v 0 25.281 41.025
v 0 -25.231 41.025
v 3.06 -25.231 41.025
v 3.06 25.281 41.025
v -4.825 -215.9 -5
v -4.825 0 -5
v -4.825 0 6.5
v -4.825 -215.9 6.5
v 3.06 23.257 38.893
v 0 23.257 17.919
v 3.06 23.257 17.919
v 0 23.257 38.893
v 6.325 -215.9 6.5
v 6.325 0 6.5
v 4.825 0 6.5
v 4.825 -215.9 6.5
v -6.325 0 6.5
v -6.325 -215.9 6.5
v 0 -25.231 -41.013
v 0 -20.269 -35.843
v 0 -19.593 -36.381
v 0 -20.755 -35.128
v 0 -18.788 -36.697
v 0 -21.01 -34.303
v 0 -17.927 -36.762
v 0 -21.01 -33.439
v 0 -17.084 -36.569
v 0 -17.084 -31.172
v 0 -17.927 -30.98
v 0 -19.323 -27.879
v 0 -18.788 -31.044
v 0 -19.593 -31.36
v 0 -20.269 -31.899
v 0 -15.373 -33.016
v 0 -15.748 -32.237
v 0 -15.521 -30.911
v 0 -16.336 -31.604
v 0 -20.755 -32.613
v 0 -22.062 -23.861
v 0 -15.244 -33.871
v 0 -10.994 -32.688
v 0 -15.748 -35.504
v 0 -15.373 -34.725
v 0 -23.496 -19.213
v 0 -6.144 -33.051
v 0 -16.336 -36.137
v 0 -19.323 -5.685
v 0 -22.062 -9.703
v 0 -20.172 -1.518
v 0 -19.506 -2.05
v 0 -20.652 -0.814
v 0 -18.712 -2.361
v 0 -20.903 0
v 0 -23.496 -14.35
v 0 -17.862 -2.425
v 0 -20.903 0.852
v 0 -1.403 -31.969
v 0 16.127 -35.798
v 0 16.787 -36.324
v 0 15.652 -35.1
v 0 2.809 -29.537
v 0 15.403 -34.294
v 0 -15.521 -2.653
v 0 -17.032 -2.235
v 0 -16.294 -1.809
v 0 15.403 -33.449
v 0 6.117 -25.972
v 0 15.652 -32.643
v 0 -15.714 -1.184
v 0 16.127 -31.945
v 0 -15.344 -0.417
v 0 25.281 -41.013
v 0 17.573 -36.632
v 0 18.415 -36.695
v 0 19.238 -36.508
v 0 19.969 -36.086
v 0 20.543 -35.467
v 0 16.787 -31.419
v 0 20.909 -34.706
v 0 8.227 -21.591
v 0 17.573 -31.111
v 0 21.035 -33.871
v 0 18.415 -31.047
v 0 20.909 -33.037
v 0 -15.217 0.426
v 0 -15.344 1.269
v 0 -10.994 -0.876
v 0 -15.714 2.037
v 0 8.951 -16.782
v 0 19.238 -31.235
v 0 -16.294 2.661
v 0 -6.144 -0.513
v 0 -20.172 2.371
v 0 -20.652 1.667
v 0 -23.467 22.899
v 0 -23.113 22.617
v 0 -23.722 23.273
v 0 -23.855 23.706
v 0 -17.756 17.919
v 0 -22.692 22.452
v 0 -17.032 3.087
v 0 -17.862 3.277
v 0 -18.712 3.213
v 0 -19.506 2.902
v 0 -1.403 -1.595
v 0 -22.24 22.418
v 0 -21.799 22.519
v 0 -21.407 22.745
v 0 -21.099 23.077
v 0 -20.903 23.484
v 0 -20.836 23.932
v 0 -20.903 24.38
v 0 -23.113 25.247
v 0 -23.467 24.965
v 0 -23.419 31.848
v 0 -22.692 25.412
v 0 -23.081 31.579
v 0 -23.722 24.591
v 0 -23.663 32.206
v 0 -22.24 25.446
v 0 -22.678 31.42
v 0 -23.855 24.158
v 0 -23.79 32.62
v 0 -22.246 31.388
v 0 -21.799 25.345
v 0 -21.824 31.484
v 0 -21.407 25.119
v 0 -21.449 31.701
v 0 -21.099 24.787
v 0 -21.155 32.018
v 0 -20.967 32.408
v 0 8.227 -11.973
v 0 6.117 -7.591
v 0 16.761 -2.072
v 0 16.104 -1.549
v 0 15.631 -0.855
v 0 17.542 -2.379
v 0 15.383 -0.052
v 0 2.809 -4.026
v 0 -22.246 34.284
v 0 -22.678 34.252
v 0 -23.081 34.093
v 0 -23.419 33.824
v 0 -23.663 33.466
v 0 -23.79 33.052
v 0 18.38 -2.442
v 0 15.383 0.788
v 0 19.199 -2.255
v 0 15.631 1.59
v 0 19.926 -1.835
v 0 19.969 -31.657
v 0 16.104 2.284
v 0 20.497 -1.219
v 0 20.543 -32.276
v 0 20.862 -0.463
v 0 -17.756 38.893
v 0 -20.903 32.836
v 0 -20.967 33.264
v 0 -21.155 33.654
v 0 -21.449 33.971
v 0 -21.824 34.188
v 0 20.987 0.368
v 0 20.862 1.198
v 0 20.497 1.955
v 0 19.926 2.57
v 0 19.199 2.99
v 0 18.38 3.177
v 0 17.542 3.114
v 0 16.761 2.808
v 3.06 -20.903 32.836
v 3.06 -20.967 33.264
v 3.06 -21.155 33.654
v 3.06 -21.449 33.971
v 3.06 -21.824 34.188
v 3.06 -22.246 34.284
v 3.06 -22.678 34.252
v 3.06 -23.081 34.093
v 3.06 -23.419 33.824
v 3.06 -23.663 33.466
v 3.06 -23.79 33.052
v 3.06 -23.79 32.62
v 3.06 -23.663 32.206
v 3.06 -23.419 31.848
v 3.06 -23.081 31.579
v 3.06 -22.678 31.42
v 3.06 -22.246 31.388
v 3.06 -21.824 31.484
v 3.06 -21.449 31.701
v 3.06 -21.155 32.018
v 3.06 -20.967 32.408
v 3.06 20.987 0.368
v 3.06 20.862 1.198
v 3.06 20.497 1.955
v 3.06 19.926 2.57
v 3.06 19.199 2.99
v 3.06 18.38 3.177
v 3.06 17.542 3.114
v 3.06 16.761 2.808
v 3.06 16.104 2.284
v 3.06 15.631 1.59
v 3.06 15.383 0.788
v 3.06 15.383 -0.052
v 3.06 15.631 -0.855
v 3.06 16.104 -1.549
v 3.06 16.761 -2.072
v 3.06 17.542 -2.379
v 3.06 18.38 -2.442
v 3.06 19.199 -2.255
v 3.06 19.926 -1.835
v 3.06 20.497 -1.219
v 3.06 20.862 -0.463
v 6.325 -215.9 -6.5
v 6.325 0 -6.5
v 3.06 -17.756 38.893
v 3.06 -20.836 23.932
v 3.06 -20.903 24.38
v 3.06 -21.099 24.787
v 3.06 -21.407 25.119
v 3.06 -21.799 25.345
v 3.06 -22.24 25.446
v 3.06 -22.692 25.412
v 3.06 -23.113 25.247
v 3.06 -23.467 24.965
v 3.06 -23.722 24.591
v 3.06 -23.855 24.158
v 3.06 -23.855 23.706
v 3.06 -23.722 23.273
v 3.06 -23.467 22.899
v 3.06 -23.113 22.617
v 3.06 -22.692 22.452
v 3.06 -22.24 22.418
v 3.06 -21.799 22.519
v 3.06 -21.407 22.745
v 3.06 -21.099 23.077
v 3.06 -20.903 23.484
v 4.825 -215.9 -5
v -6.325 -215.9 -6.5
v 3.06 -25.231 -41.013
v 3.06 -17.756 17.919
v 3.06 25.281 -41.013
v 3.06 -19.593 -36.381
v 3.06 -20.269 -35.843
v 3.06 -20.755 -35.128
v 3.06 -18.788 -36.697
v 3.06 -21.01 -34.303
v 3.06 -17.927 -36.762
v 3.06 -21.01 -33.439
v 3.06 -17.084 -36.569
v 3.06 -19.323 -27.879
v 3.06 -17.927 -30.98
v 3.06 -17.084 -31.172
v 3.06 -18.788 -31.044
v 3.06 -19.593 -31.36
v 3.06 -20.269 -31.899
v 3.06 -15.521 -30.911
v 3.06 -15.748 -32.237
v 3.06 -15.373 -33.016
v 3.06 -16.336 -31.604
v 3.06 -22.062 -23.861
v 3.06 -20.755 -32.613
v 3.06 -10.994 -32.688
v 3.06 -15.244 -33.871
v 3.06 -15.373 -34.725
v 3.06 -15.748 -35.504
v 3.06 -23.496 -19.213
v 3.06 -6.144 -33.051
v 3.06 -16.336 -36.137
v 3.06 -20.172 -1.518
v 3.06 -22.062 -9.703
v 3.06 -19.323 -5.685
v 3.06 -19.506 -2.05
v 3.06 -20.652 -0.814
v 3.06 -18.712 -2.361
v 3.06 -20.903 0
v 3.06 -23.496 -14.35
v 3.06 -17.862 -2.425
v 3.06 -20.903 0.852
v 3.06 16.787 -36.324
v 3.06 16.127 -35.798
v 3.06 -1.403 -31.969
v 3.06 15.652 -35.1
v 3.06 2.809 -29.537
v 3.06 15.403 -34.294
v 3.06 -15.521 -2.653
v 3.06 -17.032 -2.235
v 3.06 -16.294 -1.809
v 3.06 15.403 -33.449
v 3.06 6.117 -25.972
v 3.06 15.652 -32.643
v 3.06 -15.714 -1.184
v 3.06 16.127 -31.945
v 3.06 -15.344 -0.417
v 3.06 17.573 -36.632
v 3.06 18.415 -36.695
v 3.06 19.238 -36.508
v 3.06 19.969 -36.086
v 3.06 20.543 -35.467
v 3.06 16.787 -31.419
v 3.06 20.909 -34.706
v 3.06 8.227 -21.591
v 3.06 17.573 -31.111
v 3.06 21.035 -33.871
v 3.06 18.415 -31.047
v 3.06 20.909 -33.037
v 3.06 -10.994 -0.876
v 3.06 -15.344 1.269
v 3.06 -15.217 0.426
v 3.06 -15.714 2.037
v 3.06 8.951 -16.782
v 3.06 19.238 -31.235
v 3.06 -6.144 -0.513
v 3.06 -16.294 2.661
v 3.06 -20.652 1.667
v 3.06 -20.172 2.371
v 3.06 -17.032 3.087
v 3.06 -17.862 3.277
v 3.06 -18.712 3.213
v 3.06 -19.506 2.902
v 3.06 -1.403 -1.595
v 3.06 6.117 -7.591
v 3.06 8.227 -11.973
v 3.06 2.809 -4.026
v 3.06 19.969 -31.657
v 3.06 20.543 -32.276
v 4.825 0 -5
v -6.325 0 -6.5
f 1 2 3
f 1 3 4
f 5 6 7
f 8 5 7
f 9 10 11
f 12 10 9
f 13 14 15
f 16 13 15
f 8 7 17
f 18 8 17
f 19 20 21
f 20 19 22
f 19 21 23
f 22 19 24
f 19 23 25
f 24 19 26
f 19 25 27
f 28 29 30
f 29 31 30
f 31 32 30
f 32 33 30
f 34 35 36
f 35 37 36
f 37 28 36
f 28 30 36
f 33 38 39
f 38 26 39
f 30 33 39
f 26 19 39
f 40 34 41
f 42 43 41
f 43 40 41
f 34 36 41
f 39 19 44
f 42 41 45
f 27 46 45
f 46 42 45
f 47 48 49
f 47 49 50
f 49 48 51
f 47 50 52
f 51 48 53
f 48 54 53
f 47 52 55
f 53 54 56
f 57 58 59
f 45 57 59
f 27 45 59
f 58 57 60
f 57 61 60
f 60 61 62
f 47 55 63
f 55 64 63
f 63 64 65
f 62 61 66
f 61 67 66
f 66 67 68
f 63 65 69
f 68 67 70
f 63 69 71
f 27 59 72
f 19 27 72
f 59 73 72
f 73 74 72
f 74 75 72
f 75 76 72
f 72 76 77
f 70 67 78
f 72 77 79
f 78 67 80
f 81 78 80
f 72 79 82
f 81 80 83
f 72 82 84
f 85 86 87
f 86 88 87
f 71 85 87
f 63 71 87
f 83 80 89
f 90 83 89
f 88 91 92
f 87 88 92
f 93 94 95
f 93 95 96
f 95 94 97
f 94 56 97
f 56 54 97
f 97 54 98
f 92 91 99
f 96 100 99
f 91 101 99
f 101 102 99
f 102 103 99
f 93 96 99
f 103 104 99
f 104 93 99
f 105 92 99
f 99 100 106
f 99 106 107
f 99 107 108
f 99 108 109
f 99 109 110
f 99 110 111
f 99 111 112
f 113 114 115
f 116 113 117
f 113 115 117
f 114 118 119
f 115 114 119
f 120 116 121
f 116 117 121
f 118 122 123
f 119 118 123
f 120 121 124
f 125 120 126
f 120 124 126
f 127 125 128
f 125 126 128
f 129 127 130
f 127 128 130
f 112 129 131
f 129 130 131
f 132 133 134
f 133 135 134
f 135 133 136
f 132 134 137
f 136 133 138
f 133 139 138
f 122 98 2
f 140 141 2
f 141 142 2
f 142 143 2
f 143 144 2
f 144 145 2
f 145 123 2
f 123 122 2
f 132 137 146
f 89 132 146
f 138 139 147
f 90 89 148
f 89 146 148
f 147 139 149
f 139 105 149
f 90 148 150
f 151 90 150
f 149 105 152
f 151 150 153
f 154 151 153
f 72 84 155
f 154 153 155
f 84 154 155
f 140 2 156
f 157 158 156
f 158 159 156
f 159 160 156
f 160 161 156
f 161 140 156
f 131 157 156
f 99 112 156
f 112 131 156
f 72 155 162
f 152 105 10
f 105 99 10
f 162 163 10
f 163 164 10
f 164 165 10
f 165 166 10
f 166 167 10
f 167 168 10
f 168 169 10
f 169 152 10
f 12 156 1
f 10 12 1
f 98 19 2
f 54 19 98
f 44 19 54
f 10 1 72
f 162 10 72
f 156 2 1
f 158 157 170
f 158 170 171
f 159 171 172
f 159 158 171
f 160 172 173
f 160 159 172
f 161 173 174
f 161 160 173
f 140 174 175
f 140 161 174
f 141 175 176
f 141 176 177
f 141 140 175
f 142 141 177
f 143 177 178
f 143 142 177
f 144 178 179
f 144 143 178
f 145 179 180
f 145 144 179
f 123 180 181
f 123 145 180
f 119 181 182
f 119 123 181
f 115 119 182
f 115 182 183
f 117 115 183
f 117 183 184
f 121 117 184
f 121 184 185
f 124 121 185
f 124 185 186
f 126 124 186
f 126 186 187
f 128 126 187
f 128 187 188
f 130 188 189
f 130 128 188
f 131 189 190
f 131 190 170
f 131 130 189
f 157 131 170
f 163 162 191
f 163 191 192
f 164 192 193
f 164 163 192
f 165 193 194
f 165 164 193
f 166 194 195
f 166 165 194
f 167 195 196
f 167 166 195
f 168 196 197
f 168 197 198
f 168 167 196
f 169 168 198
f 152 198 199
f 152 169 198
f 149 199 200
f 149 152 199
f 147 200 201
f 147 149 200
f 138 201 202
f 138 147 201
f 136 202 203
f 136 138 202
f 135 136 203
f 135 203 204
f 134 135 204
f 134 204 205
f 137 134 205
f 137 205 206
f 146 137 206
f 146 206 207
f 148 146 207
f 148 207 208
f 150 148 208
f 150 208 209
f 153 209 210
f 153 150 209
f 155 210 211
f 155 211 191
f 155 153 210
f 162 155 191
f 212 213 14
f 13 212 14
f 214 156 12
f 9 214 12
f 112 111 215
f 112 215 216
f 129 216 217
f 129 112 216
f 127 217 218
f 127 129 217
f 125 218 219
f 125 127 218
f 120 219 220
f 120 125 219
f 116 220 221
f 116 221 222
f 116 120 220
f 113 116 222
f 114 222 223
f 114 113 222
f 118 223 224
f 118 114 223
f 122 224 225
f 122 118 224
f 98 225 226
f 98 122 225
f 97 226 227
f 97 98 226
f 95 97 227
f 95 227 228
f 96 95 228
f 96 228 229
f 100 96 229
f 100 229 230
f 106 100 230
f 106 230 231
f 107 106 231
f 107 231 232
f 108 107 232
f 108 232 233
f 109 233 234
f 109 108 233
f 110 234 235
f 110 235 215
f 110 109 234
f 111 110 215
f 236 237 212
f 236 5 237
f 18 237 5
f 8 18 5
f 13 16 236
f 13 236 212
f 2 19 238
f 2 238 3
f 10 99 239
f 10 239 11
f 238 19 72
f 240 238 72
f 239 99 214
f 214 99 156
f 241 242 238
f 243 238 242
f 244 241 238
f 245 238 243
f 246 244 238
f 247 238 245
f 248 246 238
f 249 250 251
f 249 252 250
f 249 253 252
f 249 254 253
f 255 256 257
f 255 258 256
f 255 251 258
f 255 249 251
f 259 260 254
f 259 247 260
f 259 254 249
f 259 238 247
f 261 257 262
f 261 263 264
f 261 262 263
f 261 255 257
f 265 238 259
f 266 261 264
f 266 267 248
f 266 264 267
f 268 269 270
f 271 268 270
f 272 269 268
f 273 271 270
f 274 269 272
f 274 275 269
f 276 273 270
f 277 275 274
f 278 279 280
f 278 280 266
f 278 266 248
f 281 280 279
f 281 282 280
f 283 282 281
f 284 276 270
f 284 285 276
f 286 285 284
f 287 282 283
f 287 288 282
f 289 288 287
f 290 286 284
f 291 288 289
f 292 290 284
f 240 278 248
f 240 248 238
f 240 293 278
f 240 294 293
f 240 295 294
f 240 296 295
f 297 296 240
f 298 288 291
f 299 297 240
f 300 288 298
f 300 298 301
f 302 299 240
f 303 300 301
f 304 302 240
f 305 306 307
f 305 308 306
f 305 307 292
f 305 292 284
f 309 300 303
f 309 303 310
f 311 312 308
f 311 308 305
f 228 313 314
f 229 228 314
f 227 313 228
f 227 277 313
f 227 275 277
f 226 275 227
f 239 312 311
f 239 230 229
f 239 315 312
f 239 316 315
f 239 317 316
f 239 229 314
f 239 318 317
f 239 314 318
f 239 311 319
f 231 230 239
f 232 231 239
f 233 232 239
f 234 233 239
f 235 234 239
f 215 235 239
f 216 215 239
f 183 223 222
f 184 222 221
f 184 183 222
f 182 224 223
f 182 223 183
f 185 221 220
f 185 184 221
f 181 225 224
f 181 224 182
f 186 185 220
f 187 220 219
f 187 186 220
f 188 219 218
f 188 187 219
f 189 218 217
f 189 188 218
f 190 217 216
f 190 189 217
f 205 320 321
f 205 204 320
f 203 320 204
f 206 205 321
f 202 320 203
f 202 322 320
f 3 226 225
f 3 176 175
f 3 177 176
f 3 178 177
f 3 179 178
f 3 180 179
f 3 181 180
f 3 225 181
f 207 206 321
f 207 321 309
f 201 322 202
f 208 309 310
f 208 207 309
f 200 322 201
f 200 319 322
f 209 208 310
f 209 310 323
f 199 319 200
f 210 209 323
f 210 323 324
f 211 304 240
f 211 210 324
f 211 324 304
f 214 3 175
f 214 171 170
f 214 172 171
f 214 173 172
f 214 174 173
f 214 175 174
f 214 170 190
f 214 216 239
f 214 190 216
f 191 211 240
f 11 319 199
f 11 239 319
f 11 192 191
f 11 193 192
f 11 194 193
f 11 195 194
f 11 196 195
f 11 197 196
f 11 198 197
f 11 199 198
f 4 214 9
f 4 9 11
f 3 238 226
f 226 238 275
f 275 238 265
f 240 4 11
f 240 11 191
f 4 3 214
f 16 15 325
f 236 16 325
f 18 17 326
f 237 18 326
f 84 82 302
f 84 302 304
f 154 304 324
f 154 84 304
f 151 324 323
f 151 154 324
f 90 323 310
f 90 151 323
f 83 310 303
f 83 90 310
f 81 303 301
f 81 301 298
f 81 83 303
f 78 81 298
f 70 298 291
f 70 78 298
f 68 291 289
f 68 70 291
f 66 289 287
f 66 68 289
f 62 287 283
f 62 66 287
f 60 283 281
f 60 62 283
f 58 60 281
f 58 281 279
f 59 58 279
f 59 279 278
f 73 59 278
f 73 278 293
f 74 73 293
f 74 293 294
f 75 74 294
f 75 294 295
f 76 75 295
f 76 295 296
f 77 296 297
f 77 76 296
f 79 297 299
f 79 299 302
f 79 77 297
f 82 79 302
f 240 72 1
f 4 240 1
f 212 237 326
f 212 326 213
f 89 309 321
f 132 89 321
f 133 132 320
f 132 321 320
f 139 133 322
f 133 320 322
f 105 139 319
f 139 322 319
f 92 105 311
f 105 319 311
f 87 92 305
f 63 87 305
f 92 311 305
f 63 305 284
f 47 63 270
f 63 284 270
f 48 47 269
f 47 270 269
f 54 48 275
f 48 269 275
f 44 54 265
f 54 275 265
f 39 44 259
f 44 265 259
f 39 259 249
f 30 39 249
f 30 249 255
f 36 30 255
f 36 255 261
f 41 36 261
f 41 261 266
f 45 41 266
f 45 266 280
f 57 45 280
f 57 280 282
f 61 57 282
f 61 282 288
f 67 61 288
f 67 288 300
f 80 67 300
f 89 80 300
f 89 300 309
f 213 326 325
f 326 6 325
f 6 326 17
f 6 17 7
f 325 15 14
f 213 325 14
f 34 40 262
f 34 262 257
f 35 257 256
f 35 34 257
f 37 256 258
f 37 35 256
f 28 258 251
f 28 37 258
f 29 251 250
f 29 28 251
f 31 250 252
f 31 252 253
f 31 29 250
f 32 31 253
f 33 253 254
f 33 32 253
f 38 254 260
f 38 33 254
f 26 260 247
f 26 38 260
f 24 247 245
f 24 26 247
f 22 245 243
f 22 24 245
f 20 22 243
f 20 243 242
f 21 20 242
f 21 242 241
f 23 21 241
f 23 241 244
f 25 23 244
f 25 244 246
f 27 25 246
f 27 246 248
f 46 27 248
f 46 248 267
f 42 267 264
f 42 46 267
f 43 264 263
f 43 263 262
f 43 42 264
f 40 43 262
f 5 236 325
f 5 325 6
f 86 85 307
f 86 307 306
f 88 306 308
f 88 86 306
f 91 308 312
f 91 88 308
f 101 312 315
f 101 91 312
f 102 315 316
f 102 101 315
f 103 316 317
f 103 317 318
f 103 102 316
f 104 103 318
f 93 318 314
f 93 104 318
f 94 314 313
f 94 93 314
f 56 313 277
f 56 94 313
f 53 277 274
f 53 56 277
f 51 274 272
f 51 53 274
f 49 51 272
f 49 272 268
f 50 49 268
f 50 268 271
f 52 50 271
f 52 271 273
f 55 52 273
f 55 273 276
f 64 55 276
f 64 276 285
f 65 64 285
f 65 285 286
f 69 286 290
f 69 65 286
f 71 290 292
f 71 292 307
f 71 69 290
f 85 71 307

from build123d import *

# Parameters (mm, degrees)
F1_DEPTH = 215.9
F2_W     = 50.5127292126
F2_H     = 82.0375010371
F2_R     = 2.89913405
F2_R_2   = 2.8318920873
F2_R_3   = 2.8588761336
F2_R_4   = 1.5183628154
F2_R_5   = 1.4519166982
F2_R_6   = 2.8173846153
F2_W_2   = 41.0130396485
F2_H_2   = 20.9737662226
F3_DEPTH = 3.06
F5_R     = 16.3147290841
F6_DEPTH = 5


with BuildPart() as f1:
    # F0 (on Front) → F1 (new body)
    with BuildSketch(Plane.XZ):
        Polygon((-4.825, 6.5), (-6.325, 6.5), (-6.325, -6.5), (6.325, -6.5), (6.325, 6.5), (4.825, 6.5), (4.825, -5), (-4.825, -5), align=None)
    extrude(amount=F1_DEPTH)


with BuildPart() as f3:
    # F2 (on Right) → F3 (new body)
    with BuildSketch(Plane.YZ):
        with Locations((0.0250553712, 0.0057928264)):
            Rectangle(F2_W, F2_H)
        with Locations((-18.1433722998, -33.8706020266)):
            Circle(F2_R, mode=Mode.SUBTRACT)
        with Locations((18.2029870339, -33.8714673854)):
            Circle(F2_R_2, mode=Mode.SUBTRACT)
        with Locations((-18.0760649964, 0.4261299481)):
            Circle(F2_R_3, mode=Mode.SUBTRACT)
        with Locations((-22.3539447378, 23.9319726942)):
            Circle(F2_R_4, mode=Mode.SUBTRACT)
        with Locations((-22.3546241195, 32.8359914765)):
            Circle(F2_R_5, mode=Mode.SUBTRACT)
        with Locations((18.1693327613, 0.3677118686)):
            Circle(F2_R_6, mode=Mode.SUBTRACT)
        with Locations((2.7500502765, 28.4059746191)):
            Rectangle(F2_W_2, F2_H_2, mode=Mode.SUBTRACT)
    extrude(amount=F3_DEPTH)

    # F5 (on face) → F6 (cut)
    with BuildSketch(Plane.YZ.offset(3.06)):
        with Locations((-7.363283649, -16.781862238)):
            Circle(F5_R)
    extrude(amount=-F6_DEPTH, mode=Mode.SUBTRACT)


solid = Compound([f1.part, f3.part])
